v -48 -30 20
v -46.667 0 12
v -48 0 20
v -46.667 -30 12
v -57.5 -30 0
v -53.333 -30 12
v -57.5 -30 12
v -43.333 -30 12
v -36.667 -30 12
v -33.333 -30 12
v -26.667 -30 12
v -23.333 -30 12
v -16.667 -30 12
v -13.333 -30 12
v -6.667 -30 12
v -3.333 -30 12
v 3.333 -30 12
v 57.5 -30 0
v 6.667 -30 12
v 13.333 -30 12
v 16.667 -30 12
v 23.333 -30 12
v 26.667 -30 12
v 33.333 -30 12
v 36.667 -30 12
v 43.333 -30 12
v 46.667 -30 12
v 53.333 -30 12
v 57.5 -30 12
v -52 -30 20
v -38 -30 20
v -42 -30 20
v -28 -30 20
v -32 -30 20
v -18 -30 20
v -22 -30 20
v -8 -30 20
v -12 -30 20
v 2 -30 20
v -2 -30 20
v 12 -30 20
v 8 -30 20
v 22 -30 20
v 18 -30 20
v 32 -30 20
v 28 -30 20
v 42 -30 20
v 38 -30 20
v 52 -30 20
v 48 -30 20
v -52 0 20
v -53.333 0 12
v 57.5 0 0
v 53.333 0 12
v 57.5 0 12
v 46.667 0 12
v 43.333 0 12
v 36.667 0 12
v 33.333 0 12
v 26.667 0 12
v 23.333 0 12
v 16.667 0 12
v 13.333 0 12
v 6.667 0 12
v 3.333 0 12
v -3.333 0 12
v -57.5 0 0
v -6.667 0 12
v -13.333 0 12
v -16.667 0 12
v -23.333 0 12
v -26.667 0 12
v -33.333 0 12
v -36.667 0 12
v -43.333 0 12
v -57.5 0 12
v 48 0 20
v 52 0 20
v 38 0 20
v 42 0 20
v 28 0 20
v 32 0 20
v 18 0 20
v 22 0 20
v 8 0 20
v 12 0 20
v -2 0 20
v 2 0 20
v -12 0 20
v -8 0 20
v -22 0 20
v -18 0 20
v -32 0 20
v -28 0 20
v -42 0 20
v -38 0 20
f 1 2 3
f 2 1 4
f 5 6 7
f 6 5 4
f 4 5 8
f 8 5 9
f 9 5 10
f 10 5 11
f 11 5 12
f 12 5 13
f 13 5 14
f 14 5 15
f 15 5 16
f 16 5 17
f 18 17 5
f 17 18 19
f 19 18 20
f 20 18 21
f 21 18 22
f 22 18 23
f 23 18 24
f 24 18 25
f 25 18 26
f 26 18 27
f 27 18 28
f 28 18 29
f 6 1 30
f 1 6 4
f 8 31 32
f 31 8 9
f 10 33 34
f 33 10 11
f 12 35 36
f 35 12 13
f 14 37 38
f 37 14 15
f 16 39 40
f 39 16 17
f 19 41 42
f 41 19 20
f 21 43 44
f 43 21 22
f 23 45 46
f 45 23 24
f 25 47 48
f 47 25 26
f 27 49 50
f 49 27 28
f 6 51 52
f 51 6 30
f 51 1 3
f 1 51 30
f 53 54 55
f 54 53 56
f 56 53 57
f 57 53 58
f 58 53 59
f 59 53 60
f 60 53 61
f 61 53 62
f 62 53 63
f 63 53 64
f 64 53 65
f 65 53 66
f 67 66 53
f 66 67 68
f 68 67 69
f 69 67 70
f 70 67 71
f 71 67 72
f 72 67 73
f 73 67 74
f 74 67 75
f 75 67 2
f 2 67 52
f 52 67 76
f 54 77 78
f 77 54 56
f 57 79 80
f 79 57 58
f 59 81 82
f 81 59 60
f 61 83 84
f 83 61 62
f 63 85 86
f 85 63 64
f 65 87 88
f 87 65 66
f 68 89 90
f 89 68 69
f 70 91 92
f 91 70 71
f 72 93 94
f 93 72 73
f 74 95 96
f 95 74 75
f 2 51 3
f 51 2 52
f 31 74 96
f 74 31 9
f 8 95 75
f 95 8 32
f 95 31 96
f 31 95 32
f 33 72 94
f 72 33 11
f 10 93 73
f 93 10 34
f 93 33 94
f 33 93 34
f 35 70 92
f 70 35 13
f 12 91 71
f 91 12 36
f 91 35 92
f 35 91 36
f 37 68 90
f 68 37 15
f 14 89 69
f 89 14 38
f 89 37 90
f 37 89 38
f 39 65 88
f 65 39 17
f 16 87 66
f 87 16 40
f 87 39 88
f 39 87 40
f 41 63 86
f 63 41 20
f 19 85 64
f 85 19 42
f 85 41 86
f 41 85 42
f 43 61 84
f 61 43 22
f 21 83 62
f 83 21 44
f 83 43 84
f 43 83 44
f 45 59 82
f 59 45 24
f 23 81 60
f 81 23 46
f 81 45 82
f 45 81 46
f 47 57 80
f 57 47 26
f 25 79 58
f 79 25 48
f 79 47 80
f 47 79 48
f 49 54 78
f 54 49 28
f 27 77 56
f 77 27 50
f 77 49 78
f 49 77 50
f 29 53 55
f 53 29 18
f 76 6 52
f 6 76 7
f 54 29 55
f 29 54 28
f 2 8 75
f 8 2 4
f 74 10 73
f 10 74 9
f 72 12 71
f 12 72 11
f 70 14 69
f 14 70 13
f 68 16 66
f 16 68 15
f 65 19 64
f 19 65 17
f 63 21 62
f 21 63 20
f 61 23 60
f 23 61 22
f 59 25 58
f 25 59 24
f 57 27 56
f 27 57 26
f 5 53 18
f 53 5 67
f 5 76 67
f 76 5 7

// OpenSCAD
$fn = 32;

// ----------------------------------------------------------------------
// Toothed rack, 11 teeth
// 10 mm pitch, 8 mm teeth
// ----------------------------------------------------------------------

// --- parameters (mm) ---
bar_w = 30;   // bar width (Y)
bar_h = 12;   // bar height (Z)
teeth = 11;   // number of teeth
pitch = 10;   // tooth pitch
tooth_h = 8;  // tooth height above the bar
root_w = 7;   // tooth width at the root
crest_w = 4;  // tooth width at the crest

// --- derived feature positions (mm) ---
span = (teeth - 1) * pitch;  // = 100   distance between the outer teeth
bar_l = span + root_w + 8;   // = 115   bar length: teeth plus 4 mm at each end
tooth_x = -span / 2;         // = -50   X of the first tooth
height = bar_h + tooth_h;    // = 20   overall height
feature_centers = [
  [tooth_x + 0 * pitch, -bar_w / 2],
  [tooth_x + 1 * pitch, -bar_w / 2],
  [tooth_x + 2 * pitch, -bar_w / 2],
  [tooth_x + 3 * pitch, -bar_w / 2],
  [tooth_x + 4 * pitch, -bar_w / 2],
  [tooth_x + 5 * pitch, -bar_w / 2],
  [tooth_x + 6 * pitch, -bar_w / 2],
  [tooth_x + 7 * pitch, -bar_w / 2],
  [tooth_x + 8 * pitch, -bar_w / 2],
  [tooth_x + 9 * pitch, -bar_w / 2],
  [tooth_x + 10 * pitch, -bar_w / 2]
];   // tooth centre line, drives the tooth loop

// bar with a rack of teeth, one extruded trapezoium per centre
module rack_tooth() {
  linear_extrude(height = bar_w)
    polygon(points = [
      [0, 0],
      [root_w, 0],
      [root_w / 2 + crest_w / 2, tooth_h + 1],
      [root_w / 2 - crest_w / 2, tooth_h + 1]
    ]);
}

union() {
  translate([-bar_l / 2, -bar_w, 0]) cube([bar_l, bar_w, bar_h]);
  for (centre = feature_centers)
    translate([centre[0] - root_w / 2, 0, bar_h - 1]) rotate([90, 0, 0]) rack_tooth();
}
